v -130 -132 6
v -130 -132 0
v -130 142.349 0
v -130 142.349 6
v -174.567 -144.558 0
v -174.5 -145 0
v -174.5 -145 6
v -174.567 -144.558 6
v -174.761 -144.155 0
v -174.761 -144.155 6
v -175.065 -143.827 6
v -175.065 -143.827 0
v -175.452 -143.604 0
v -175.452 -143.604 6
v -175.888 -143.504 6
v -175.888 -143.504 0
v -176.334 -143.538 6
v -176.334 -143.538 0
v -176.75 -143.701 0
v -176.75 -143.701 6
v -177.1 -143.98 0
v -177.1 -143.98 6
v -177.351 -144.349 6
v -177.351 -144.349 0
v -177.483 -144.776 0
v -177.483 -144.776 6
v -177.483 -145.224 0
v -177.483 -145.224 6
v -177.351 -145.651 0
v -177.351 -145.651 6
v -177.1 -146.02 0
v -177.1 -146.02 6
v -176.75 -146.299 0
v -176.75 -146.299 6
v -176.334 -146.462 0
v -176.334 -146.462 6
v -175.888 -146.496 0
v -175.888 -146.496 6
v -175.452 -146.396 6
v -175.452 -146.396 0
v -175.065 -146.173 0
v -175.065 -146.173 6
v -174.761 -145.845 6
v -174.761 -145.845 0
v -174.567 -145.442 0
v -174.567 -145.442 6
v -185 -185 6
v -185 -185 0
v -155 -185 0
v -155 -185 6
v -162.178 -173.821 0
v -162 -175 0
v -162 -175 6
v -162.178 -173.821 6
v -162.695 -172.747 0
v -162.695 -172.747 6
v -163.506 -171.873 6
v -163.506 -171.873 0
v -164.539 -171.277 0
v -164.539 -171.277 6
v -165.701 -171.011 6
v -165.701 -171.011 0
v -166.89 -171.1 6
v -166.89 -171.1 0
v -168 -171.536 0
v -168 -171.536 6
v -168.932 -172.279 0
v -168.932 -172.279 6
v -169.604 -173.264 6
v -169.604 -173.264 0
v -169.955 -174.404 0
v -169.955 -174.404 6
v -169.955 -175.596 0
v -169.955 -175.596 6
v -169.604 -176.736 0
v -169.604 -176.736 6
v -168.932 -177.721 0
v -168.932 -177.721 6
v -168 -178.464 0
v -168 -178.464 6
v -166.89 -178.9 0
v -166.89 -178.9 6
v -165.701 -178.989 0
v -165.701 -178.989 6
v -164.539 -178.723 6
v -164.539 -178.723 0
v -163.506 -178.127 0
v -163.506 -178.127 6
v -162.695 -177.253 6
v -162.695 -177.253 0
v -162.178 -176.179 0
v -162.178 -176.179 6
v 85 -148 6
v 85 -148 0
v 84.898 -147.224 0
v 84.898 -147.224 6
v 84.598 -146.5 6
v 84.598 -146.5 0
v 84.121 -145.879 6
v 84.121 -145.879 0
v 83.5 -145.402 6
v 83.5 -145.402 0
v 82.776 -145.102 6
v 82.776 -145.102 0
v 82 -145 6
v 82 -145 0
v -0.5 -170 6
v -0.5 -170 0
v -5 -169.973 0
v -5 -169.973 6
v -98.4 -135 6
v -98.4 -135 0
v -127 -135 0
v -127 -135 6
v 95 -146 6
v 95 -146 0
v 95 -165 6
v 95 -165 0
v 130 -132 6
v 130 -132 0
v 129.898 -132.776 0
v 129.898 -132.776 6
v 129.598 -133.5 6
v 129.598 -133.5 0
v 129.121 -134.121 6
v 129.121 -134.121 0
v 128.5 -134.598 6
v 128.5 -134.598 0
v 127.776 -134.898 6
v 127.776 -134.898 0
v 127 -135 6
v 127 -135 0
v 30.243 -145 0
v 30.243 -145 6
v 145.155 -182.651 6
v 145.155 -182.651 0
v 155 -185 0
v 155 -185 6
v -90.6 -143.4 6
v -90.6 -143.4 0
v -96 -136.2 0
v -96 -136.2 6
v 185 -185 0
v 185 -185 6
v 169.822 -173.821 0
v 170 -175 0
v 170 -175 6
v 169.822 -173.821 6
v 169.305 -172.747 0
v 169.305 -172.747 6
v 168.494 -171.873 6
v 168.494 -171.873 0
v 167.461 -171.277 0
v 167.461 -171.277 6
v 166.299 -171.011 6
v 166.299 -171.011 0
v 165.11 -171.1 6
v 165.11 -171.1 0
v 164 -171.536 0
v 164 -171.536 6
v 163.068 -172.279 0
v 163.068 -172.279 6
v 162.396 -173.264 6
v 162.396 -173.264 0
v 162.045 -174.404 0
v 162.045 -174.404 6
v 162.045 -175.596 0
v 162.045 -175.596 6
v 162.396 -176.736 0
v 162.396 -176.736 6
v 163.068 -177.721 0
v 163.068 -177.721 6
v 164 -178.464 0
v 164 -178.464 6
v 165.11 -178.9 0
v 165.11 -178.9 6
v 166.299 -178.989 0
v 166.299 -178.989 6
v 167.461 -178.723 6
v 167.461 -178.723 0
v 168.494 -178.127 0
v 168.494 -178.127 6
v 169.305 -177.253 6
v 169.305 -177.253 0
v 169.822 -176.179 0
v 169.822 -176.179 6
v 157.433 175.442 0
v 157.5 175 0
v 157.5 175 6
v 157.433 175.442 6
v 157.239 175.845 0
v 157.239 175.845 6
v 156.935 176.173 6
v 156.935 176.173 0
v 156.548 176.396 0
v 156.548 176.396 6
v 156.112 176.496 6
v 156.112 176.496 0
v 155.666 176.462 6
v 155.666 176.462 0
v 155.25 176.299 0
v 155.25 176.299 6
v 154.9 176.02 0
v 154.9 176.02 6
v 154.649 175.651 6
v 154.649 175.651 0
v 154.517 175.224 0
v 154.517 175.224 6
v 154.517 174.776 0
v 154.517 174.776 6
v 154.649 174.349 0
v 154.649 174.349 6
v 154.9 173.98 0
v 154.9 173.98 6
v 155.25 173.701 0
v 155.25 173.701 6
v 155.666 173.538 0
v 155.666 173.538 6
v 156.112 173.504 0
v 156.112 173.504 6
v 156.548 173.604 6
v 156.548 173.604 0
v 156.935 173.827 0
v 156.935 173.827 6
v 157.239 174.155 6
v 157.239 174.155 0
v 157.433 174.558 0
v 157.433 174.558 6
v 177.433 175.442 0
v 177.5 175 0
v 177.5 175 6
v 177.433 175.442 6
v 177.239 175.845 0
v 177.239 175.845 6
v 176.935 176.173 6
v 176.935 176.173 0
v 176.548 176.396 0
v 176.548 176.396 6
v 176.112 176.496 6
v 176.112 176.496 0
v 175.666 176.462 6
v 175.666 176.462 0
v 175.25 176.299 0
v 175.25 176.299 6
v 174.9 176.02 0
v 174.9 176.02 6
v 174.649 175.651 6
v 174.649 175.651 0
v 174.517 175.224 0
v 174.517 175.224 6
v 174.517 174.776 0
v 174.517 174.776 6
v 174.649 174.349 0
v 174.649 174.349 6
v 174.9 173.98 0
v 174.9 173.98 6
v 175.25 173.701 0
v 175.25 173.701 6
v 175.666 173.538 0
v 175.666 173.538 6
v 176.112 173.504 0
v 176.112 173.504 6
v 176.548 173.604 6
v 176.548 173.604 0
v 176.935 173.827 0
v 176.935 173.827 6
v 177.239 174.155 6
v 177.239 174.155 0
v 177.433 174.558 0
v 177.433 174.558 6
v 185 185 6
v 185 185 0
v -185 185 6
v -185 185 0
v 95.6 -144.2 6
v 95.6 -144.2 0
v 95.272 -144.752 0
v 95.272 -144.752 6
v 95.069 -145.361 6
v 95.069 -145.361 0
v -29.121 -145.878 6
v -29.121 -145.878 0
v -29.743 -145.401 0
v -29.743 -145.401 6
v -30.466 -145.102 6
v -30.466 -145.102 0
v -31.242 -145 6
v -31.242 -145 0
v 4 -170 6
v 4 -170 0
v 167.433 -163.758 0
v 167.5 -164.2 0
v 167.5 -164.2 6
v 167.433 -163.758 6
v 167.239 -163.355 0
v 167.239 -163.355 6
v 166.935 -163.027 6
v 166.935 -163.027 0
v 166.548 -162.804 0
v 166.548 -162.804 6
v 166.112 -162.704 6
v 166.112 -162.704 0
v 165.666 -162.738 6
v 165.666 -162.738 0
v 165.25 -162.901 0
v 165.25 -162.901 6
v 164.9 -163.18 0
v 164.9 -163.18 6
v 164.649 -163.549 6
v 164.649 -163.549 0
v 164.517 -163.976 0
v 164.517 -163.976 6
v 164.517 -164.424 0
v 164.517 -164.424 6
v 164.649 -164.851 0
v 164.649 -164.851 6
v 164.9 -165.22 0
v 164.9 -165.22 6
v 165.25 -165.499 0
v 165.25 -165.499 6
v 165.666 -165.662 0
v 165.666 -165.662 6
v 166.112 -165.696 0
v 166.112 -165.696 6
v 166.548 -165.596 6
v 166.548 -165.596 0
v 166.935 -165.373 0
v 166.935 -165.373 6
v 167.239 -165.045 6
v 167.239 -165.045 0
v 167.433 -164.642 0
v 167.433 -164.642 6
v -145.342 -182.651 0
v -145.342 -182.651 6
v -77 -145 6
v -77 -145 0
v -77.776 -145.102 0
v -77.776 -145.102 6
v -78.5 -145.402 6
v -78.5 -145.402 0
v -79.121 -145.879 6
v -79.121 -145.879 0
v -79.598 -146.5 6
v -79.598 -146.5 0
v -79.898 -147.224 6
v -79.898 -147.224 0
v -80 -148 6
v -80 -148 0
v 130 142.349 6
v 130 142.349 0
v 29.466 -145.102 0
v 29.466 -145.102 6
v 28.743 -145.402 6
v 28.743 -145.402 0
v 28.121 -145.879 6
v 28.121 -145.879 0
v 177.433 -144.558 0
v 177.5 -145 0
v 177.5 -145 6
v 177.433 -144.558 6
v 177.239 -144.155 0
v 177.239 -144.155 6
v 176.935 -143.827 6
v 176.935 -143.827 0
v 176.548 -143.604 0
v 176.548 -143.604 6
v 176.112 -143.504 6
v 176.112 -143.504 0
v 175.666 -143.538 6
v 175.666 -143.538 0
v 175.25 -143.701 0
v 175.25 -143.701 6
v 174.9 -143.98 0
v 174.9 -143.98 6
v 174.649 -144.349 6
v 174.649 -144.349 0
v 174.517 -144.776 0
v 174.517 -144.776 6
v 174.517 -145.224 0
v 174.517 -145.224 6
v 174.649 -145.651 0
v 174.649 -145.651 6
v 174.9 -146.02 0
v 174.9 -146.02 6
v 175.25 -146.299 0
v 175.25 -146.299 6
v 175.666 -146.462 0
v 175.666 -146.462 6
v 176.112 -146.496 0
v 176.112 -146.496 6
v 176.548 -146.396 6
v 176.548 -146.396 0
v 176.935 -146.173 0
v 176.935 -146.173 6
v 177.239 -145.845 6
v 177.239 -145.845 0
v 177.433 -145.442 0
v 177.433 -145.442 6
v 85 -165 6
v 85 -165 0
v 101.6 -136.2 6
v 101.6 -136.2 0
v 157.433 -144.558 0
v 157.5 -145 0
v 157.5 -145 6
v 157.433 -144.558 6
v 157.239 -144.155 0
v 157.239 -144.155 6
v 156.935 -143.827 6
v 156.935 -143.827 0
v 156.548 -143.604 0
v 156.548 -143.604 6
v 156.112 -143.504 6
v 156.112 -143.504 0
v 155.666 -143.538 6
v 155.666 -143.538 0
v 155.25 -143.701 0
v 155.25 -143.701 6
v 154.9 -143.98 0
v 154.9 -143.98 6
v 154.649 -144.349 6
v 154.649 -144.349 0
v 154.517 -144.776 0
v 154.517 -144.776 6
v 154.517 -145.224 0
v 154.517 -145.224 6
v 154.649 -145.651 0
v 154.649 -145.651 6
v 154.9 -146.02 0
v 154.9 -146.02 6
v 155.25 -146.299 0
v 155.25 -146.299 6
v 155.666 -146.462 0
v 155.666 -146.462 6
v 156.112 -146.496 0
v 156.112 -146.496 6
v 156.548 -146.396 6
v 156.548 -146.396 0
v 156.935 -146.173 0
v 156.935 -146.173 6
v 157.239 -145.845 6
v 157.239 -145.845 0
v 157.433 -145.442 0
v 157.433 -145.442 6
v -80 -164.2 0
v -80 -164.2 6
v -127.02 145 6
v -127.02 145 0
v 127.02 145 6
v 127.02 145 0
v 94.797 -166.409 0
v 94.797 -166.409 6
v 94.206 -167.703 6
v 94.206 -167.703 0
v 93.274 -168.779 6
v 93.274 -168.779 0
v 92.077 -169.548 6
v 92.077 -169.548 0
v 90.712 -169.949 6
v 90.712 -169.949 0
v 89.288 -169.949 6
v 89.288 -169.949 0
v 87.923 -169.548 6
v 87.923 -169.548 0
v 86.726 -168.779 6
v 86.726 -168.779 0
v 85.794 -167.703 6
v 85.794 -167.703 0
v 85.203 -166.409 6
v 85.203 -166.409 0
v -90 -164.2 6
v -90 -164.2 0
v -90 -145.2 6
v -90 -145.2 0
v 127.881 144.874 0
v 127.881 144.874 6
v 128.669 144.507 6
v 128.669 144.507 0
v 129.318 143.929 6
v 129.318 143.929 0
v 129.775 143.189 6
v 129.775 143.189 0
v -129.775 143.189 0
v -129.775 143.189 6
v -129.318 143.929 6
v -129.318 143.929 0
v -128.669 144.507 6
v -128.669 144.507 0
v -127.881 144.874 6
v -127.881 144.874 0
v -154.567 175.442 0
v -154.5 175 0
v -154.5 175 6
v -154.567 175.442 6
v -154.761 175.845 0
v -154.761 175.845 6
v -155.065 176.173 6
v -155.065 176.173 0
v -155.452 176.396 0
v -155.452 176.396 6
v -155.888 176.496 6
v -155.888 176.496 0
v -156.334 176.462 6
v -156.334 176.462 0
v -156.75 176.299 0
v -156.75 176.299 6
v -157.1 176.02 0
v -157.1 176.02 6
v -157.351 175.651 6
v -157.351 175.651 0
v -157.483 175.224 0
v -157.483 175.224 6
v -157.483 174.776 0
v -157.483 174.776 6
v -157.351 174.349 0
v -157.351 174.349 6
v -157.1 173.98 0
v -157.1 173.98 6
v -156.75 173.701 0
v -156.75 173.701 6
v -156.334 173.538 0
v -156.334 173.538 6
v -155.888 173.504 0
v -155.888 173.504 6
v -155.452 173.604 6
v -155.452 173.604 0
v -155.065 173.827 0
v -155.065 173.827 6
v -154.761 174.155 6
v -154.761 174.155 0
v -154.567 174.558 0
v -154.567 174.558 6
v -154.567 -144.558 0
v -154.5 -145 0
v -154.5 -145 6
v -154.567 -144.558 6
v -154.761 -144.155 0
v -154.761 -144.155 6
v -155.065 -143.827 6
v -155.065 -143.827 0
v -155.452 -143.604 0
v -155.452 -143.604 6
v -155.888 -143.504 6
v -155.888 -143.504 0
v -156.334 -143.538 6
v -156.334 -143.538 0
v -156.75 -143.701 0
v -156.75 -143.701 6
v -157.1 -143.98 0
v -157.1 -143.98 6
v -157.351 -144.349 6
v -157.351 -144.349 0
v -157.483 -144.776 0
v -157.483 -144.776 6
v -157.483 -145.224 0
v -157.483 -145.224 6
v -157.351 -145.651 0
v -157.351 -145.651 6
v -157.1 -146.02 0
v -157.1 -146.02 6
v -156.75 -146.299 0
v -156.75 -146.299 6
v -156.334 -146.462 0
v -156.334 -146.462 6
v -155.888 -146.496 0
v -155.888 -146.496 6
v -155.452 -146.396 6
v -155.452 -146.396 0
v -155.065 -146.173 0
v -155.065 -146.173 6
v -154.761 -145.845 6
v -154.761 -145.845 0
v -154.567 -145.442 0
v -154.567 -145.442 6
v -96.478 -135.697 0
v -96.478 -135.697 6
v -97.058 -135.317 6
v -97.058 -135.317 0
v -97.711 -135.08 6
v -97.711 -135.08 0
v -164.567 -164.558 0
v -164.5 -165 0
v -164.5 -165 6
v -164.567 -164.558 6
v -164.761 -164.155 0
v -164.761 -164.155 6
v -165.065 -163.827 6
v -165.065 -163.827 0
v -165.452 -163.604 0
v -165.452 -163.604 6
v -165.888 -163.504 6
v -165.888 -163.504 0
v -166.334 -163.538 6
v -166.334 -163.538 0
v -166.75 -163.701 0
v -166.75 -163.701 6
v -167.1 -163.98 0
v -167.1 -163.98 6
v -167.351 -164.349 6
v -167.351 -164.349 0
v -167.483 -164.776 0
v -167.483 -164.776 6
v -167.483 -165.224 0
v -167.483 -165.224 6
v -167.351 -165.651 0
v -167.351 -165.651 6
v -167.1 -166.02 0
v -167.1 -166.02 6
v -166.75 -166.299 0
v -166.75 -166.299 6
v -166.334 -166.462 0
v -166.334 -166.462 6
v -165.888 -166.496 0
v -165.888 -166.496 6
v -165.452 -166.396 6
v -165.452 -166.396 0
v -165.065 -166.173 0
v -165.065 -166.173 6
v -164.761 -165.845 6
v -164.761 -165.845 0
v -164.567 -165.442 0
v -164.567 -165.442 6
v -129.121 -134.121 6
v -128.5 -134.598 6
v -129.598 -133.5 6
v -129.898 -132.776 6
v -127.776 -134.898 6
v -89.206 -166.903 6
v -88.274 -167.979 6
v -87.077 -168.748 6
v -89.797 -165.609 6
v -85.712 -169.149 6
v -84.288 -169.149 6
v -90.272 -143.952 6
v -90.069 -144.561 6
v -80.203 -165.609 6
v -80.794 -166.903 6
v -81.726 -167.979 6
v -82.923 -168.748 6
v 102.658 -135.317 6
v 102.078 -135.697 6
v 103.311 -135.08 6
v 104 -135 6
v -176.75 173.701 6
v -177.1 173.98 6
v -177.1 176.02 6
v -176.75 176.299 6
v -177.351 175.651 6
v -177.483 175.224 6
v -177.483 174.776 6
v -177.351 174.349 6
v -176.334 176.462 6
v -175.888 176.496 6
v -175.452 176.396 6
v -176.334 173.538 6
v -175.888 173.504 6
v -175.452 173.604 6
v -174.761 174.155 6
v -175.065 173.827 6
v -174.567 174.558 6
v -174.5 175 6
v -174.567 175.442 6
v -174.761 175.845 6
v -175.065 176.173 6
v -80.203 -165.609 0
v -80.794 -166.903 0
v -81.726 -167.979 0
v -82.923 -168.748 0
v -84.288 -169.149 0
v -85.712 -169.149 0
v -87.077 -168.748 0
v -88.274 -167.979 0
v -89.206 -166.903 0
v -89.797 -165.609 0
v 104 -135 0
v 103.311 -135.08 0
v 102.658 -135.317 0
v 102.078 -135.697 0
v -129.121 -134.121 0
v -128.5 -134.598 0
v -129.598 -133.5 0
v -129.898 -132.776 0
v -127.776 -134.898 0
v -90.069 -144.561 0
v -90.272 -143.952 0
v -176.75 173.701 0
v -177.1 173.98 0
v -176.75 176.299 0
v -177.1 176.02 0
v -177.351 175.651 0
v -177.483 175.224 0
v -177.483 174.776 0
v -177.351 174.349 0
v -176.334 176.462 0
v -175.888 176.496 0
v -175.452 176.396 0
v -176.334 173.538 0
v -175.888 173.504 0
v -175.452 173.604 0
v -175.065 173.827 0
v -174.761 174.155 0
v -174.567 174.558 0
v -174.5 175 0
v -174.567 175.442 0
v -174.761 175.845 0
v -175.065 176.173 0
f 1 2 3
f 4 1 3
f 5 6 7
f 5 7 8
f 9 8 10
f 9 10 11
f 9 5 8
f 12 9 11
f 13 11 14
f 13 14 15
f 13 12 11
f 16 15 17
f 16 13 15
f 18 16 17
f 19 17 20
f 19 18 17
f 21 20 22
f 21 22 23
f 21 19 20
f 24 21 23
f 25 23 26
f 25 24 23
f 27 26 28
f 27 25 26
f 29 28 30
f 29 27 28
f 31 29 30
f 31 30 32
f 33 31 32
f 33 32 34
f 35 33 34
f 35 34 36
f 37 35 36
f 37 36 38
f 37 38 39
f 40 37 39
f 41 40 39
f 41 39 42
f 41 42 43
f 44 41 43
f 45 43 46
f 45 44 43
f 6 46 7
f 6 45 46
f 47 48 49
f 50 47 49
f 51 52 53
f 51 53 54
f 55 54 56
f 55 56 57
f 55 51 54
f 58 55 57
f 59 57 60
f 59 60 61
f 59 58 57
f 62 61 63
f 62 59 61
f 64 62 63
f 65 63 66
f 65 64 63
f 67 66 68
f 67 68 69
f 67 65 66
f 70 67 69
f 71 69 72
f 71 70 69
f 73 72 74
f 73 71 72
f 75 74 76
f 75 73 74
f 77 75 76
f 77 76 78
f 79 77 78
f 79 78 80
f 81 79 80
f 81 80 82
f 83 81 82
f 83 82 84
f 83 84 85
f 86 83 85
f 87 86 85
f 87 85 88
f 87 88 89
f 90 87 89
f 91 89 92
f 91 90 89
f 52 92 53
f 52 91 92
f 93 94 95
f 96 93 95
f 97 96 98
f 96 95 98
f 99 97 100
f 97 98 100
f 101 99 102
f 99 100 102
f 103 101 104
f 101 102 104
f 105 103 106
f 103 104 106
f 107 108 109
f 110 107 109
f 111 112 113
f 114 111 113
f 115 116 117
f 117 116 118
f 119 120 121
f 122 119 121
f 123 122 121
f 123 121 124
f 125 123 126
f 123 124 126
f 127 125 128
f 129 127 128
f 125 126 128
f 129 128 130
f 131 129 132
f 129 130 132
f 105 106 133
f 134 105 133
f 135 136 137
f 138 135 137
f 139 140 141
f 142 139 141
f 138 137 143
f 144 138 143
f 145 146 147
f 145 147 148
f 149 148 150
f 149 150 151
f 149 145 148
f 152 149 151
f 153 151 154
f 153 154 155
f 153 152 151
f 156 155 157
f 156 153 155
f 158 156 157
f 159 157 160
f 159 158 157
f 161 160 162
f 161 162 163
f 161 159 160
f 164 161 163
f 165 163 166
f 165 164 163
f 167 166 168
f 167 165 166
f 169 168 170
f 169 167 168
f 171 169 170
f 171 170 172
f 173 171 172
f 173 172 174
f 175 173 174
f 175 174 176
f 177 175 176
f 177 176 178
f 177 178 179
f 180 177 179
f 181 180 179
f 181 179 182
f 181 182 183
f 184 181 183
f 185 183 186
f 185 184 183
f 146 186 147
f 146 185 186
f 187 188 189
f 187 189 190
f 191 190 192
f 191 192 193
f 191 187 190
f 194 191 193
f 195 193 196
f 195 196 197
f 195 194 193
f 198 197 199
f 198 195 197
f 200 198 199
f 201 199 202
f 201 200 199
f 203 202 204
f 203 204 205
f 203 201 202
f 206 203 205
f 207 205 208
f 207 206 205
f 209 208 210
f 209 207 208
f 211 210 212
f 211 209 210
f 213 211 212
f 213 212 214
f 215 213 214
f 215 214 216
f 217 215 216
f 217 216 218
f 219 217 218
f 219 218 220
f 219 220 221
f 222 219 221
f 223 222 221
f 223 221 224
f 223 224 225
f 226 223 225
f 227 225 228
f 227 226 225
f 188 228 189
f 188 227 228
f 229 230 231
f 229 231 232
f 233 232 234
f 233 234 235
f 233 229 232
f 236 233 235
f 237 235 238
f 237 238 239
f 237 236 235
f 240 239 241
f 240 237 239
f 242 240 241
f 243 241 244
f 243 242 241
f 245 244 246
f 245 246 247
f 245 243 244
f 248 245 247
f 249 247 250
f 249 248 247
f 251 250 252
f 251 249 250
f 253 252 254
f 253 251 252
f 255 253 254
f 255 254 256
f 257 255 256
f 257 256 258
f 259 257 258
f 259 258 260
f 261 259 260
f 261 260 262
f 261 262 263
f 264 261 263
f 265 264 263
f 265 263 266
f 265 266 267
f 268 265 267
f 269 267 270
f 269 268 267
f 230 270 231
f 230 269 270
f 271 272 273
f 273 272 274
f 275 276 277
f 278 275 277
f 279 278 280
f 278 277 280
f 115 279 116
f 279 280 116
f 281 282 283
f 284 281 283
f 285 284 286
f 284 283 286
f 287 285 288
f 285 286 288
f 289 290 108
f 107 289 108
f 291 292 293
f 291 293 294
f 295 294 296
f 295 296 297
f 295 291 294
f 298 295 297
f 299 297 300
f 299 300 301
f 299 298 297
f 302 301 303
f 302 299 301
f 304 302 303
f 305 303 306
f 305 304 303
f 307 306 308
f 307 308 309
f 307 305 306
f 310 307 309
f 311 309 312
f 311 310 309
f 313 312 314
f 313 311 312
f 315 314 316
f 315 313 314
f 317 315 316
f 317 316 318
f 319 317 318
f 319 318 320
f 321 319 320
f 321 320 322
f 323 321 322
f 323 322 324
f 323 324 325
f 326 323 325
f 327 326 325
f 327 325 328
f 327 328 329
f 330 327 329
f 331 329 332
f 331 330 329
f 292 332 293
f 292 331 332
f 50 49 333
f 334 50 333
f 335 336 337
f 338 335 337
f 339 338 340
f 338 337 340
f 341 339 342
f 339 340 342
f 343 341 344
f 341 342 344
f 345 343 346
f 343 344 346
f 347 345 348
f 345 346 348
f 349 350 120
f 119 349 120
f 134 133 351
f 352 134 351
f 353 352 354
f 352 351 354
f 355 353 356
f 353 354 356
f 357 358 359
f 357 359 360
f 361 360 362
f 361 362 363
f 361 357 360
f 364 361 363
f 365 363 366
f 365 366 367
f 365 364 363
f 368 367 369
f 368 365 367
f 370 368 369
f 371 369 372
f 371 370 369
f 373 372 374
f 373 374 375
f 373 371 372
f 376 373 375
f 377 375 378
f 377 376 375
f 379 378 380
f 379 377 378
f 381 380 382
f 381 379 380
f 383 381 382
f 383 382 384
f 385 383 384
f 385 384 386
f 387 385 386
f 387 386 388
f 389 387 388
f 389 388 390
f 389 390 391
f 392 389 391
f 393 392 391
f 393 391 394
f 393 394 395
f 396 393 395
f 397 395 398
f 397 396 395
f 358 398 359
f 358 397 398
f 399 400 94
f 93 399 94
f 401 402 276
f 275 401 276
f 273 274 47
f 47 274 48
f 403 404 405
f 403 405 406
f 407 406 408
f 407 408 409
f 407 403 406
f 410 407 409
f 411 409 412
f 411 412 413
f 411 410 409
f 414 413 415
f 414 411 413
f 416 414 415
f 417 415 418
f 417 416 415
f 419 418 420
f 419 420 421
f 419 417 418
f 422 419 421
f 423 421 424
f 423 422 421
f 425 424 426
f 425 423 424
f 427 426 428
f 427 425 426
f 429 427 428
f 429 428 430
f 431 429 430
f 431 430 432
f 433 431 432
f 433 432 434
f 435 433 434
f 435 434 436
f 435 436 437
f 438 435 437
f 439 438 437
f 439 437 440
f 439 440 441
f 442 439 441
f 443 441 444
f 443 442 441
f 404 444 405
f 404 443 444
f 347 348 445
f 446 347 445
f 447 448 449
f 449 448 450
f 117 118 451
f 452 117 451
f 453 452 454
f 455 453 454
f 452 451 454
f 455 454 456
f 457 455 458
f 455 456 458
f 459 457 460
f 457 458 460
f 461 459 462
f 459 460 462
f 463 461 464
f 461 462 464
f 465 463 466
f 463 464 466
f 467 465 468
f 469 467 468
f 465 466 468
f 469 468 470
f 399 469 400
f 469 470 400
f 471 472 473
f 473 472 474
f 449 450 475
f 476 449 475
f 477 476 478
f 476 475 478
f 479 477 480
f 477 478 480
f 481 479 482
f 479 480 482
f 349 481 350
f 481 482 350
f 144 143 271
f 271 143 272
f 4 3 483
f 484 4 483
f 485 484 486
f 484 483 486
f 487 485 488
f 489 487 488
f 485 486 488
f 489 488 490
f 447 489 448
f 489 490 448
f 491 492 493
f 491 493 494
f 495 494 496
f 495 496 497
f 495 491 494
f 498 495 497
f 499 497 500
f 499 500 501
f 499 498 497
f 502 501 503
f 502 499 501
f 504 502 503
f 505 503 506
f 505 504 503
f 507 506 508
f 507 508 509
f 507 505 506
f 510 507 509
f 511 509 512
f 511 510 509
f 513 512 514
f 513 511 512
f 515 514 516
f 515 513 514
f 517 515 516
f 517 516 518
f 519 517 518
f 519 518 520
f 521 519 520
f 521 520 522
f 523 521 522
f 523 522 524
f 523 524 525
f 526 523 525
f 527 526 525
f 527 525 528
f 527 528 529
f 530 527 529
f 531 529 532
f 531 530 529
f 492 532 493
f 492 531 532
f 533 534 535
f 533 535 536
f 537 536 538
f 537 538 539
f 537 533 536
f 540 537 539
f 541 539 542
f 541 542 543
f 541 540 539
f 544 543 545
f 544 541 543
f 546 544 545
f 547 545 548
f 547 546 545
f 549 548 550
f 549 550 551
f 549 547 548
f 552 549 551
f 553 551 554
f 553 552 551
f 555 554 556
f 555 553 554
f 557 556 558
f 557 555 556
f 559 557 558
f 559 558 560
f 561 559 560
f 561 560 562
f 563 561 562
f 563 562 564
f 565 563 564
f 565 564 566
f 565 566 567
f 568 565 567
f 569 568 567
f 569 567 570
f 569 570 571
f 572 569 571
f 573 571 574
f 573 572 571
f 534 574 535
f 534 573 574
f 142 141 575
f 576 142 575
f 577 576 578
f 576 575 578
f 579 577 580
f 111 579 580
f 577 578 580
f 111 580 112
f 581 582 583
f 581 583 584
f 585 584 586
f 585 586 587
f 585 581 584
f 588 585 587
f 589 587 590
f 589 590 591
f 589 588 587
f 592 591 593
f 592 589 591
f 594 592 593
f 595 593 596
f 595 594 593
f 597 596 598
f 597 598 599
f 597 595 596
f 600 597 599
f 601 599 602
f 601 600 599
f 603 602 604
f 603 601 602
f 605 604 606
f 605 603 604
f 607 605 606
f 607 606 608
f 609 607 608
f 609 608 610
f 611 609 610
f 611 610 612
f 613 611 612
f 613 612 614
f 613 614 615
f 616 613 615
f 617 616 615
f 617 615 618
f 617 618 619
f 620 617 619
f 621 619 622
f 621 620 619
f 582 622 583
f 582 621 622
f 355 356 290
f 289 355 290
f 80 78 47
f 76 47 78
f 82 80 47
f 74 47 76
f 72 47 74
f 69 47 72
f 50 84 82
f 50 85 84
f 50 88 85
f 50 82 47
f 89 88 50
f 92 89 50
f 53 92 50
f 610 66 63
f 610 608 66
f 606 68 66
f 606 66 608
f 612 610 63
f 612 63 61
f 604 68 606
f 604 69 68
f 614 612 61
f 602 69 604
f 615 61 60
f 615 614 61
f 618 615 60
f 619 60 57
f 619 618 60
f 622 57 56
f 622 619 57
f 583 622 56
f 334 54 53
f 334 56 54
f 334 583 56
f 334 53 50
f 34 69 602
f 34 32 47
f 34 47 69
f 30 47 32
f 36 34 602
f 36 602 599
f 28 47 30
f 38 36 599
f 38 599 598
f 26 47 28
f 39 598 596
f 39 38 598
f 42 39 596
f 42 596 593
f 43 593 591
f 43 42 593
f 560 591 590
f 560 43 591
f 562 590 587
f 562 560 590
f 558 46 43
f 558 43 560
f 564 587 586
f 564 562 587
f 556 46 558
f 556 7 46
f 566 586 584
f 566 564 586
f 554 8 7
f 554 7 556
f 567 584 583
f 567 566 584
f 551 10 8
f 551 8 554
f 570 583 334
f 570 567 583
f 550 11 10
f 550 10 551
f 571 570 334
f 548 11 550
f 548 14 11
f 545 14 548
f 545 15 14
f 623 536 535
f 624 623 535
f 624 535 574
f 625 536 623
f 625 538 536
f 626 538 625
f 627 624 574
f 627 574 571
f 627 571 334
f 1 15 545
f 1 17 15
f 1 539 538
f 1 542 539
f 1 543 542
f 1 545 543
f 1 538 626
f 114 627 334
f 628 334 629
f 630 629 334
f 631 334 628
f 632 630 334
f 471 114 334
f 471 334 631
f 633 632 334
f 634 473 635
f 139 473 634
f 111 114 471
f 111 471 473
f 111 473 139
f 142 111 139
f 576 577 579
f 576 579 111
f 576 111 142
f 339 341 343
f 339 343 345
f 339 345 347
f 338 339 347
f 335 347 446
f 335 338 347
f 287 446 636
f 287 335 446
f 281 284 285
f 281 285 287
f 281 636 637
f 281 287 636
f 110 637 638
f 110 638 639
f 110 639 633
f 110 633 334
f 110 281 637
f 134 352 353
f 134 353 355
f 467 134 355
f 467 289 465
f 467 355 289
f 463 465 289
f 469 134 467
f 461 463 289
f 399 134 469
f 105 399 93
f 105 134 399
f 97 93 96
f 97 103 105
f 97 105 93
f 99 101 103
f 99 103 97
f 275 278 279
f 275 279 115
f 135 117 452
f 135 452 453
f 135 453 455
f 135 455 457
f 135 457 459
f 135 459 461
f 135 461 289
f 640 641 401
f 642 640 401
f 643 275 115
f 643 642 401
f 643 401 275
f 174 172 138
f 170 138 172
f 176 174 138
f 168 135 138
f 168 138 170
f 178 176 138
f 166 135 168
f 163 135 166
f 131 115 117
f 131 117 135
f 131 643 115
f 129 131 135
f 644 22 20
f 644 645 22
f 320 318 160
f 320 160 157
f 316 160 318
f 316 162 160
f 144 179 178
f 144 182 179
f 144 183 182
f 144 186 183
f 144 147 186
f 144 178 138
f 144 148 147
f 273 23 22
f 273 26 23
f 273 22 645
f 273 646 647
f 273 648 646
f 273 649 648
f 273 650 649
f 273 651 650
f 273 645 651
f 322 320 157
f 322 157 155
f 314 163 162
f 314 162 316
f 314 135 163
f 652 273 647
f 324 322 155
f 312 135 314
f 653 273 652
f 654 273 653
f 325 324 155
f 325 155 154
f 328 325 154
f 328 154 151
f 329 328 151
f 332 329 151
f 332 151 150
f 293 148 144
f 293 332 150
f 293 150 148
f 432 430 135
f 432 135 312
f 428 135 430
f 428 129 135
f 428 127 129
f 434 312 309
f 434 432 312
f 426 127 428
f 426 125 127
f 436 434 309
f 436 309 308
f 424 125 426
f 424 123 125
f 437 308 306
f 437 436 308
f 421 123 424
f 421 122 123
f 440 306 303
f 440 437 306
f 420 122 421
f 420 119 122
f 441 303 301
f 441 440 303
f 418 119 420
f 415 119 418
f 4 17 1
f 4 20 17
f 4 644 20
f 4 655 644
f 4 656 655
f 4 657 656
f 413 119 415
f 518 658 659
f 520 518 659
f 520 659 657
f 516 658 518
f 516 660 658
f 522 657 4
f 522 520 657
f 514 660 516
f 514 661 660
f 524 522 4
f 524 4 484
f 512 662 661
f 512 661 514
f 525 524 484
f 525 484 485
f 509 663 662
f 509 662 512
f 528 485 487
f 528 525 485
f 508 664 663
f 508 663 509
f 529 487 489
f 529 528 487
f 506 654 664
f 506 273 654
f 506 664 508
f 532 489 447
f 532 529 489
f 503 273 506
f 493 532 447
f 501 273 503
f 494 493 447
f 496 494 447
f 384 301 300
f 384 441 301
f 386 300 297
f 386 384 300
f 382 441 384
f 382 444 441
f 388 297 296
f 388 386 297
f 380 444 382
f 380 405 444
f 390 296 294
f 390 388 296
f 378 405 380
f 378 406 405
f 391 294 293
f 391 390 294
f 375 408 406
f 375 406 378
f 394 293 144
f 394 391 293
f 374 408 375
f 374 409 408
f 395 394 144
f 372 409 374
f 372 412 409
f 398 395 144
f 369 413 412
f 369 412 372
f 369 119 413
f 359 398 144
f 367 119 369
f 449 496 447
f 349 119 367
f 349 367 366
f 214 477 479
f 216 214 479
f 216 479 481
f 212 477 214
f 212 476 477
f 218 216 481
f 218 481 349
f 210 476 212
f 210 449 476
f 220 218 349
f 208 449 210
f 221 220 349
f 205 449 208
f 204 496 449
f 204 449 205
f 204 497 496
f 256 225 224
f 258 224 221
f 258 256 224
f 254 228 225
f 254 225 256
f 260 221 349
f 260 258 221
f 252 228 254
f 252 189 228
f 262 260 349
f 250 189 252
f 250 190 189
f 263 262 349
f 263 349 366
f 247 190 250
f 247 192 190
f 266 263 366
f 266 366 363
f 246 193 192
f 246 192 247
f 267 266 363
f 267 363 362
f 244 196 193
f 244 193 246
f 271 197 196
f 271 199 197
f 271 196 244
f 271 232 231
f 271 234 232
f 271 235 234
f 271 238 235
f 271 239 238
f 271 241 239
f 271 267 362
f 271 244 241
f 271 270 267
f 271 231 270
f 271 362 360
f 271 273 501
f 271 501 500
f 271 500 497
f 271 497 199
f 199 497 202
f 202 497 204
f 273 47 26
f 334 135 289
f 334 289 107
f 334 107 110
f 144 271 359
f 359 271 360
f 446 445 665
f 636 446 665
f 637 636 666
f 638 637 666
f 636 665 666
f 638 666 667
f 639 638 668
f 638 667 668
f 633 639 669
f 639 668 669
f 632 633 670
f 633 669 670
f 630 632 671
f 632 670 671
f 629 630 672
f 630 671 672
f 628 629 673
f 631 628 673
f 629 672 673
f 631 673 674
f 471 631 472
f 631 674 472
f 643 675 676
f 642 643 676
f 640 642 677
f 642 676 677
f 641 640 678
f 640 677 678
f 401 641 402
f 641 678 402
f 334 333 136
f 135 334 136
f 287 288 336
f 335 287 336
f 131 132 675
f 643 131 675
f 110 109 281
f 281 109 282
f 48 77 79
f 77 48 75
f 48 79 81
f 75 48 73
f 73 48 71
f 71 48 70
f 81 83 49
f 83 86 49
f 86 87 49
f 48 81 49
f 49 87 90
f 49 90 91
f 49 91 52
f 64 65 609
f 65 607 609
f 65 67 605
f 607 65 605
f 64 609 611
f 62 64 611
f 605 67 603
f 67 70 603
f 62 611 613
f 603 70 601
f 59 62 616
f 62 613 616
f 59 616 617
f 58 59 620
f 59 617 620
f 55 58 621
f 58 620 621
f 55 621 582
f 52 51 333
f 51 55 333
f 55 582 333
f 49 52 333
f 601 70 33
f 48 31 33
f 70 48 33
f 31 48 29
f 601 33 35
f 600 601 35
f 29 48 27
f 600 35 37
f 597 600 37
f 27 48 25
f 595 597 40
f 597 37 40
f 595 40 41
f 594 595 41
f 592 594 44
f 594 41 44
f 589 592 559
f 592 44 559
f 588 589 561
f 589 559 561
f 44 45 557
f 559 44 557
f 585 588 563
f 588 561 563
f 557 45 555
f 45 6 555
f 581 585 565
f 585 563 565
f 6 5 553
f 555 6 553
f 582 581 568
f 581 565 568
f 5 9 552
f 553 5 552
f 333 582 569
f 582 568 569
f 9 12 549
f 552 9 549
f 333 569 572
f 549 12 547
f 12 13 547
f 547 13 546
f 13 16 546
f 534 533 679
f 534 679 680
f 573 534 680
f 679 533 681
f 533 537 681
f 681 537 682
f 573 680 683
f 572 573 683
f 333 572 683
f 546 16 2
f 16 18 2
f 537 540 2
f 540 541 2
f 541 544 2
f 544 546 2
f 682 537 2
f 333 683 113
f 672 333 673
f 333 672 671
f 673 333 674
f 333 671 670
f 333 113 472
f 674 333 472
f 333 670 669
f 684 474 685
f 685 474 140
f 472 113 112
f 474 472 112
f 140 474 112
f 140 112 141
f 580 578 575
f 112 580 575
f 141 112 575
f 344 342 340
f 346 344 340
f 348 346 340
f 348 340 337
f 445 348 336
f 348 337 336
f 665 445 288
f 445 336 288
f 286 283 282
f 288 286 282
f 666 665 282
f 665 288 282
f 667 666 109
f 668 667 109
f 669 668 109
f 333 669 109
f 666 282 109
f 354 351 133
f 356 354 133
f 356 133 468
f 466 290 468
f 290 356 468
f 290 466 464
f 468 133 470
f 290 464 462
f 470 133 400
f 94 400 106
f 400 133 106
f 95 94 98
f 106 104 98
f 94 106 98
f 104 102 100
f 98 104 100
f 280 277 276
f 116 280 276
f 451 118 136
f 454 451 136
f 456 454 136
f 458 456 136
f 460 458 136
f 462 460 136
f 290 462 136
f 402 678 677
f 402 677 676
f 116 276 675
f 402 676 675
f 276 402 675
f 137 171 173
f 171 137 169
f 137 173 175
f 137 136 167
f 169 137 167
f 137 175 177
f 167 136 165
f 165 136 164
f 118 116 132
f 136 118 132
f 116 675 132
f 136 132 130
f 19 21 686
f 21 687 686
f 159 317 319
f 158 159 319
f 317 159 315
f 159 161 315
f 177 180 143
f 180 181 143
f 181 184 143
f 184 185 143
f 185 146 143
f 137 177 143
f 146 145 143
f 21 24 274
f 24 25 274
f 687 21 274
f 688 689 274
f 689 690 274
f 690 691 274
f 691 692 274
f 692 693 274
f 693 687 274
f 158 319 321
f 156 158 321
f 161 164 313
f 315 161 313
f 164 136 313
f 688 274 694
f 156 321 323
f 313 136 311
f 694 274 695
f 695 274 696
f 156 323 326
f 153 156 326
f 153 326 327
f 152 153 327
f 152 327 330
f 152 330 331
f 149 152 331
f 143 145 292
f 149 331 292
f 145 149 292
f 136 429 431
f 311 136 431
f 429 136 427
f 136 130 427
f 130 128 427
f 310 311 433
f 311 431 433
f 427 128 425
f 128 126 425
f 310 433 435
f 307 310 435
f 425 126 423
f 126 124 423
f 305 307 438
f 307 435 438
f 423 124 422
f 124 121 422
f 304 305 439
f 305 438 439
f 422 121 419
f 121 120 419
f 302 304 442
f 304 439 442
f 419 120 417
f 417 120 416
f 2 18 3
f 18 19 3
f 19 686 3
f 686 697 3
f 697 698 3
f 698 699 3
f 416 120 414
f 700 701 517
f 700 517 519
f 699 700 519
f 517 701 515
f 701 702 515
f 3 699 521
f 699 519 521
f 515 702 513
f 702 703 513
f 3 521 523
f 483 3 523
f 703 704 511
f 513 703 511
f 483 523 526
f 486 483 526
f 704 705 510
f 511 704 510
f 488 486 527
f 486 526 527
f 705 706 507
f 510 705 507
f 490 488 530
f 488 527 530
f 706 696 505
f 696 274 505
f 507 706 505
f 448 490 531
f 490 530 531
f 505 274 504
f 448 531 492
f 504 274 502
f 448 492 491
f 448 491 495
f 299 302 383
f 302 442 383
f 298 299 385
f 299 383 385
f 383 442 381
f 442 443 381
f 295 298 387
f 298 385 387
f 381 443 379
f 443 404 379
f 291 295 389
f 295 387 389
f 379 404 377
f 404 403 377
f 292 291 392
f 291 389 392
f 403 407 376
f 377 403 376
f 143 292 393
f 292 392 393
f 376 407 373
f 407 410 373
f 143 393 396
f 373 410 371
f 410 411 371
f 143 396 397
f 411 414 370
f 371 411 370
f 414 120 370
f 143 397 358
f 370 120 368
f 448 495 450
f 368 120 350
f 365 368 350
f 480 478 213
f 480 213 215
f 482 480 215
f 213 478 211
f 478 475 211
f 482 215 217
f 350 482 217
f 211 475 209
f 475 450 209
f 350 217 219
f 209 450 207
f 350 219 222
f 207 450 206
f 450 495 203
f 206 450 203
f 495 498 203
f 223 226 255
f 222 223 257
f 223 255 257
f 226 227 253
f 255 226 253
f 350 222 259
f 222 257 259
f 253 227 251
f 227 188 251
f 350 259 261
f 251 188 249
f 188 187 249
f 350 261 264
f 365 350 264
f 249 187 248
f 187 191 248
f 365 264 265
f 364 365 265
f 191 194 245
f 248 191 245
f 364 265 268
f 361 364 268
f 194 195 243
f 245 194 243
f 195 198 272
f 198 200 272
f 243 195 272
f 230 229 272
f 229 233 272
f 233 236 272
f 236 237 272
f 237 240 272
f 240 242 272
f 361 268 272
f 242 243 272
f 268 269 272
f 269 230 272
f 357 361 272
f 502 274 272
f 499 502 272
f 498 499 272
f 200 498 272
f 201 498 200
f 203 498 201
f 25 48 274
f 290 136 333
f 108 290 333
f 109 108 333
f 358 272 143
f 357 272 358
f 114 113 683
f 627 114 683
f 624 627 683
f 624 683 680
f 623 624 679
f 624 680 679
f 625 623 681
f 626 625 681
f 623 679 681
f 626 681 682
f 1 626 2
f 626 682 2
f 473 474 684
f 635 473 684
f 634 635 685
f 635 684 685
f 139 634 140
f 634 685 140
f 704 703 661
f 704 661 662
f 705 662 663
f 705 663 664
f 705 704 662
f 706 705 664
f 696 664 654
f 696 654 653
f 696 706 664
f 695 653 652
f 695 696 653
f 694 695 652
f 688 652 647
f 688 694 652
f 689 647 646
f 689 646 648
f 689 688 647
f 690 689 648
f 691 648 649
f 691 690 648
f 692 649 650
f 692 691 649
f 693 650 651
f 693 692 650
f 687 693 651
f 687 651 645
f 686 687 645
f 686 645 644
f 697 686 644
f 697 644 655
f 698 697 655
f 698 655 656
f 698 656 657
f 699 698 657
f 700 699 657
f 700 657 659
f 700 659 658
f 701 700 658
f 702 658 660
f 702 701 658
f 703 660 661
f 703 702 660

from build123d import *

# Parameters (mm, degrees)
F0_R     = 4
F0_R_2   = 1.5
F1_DEPTH = 6


with BuildPart() as f1:
    # F0 (on Top) → F1 (new body)
    with BuildSketch(Plane.XY):
        Polygon((185, 185), (-185, 185), (-185, -185), (-155, -185), (-145.34165, -182.651207), (145.154789, -182.651207), (155, -185), (185, -185), align=None)
        with Locations((-166, -175)):
            Circle(F0_R, mode=Mode.SUBTRACT)
        with Locations((-166, -165)):
            Circle(F0_R_2, mode=Mode.SUBTRACT)
        with Locations((-176, -145)):
            Circle(F0_R_2, mode=Mode.SUBTRACT)
        with Locations((-156, -145)):
            Circle(F0_R_2, mode=Mode.SUBTRACT)
        with Locations((166, -175)):
            Circle(F0_R, mode=Mode.SUBTRACT)
        with Locations((166, -164.2)):
            Circle(F0_R_2, mode=Mode.SUBTRACT)
        with Locations((156, -145)):
            Circle(F0_R_2, mode=Mode.SUBTRACT)
        with Locations((176, -145)):
            Circle(F0_R_2, mode=Mode.SUBTRACT)
        with BuildLine():
            ThreePointArc((-130, 142.348793), (-129.014539, 144.241247), (-127.020345, 145))
            Line((-127.020345, 145), (127.020345, 145))
            ThreePointArc((127.020345, 145), (129.014539, 144.241247), (130, 142.348793))
            Line((130, 142.348793), (130, -132))
            ThreePointArc((130, -132), (129.12132, -134.12132), (127, -135))
            Line((127, -135), (104, -135))
            ThreePointArc((104, -135), (102.658359, -135.316718), (101.6, -136.2))
            Line((101.6, -136.2), (95.6, -144.2))
            ThreePointArc((95.6, -144.2), (95.15395, -145.051317), (95, -146))
            Line((95, -146), (95, -165))
            ThreePointArc((95, -165), (90, -170), (85, -165))
            Line((85, -165), (85, -148))
            ThreePointArc((85, -148), (84.12132, -145.87868), (82, -145))
            Line((82, -145), (30.242641, -145))
            ThreePointArc((30.242641, -145), (29.09459, -145.228361), (28.12132, -145.87868))
            Line((28.12132, -145.87868), (4, -170))
            Line((4, -170), (-0.5, -170))
            Line((-0.5, -170), (-4.999919, -169.972975))
            Line((-4.999919, -169.972975), (-29.121436, -145.877533))
            ThreePointArc((-29.121436, -145.877533), (-30.094308, -145.228051), (-31.241609, -145))
            Line((-31.241609, -145), (-77, -145))
            ThreePointArc((-77, -145), (-79.12132, -145.87868), (-80, -148))
            Line((-80, -148), (-80, -164.2))
            ThreePointArc((-80, -164.2), (-85, -169.2), (-90, -164.2))
            Line((-90, -164.2), (-90, -145.2))
            ThreePointArc((-90, -145.2), (-90.15395, -144.251317), (-90.6, -143.4))
            Line((-90.6, -143.4), (-96, -136.2))
            ThreePointArc((-96, -136.2), (-97.058359, -135.316718), (-98.4, -135))
            Line((-98.4, -135), (-127, -135))
            ThreePointArc((-127, -135), (-129.12132, -134.12132), (-130, -132))
            Line((-130, -132), (-130, 142.348793))
        make_face(mode=Mode.SUBTRACT)
        with Locations((-176, 175)):
            Circle(F0_R_2, mode=Mode.SUBTRACT)
        with Locations((-156, 175)):
            Circle(F0_R_2, mode=Mode.SUBTRACT)
        with Locations((156, 175)):
            Circle(F0_R_2, mode=Mode.SUBTRACT)
        with Locations((176, 175)):
            Circle(F0_R_2, mode=Mode.SUBTRACT)
    extrude(amount=F1_DEPTH)


solid = f1.part
